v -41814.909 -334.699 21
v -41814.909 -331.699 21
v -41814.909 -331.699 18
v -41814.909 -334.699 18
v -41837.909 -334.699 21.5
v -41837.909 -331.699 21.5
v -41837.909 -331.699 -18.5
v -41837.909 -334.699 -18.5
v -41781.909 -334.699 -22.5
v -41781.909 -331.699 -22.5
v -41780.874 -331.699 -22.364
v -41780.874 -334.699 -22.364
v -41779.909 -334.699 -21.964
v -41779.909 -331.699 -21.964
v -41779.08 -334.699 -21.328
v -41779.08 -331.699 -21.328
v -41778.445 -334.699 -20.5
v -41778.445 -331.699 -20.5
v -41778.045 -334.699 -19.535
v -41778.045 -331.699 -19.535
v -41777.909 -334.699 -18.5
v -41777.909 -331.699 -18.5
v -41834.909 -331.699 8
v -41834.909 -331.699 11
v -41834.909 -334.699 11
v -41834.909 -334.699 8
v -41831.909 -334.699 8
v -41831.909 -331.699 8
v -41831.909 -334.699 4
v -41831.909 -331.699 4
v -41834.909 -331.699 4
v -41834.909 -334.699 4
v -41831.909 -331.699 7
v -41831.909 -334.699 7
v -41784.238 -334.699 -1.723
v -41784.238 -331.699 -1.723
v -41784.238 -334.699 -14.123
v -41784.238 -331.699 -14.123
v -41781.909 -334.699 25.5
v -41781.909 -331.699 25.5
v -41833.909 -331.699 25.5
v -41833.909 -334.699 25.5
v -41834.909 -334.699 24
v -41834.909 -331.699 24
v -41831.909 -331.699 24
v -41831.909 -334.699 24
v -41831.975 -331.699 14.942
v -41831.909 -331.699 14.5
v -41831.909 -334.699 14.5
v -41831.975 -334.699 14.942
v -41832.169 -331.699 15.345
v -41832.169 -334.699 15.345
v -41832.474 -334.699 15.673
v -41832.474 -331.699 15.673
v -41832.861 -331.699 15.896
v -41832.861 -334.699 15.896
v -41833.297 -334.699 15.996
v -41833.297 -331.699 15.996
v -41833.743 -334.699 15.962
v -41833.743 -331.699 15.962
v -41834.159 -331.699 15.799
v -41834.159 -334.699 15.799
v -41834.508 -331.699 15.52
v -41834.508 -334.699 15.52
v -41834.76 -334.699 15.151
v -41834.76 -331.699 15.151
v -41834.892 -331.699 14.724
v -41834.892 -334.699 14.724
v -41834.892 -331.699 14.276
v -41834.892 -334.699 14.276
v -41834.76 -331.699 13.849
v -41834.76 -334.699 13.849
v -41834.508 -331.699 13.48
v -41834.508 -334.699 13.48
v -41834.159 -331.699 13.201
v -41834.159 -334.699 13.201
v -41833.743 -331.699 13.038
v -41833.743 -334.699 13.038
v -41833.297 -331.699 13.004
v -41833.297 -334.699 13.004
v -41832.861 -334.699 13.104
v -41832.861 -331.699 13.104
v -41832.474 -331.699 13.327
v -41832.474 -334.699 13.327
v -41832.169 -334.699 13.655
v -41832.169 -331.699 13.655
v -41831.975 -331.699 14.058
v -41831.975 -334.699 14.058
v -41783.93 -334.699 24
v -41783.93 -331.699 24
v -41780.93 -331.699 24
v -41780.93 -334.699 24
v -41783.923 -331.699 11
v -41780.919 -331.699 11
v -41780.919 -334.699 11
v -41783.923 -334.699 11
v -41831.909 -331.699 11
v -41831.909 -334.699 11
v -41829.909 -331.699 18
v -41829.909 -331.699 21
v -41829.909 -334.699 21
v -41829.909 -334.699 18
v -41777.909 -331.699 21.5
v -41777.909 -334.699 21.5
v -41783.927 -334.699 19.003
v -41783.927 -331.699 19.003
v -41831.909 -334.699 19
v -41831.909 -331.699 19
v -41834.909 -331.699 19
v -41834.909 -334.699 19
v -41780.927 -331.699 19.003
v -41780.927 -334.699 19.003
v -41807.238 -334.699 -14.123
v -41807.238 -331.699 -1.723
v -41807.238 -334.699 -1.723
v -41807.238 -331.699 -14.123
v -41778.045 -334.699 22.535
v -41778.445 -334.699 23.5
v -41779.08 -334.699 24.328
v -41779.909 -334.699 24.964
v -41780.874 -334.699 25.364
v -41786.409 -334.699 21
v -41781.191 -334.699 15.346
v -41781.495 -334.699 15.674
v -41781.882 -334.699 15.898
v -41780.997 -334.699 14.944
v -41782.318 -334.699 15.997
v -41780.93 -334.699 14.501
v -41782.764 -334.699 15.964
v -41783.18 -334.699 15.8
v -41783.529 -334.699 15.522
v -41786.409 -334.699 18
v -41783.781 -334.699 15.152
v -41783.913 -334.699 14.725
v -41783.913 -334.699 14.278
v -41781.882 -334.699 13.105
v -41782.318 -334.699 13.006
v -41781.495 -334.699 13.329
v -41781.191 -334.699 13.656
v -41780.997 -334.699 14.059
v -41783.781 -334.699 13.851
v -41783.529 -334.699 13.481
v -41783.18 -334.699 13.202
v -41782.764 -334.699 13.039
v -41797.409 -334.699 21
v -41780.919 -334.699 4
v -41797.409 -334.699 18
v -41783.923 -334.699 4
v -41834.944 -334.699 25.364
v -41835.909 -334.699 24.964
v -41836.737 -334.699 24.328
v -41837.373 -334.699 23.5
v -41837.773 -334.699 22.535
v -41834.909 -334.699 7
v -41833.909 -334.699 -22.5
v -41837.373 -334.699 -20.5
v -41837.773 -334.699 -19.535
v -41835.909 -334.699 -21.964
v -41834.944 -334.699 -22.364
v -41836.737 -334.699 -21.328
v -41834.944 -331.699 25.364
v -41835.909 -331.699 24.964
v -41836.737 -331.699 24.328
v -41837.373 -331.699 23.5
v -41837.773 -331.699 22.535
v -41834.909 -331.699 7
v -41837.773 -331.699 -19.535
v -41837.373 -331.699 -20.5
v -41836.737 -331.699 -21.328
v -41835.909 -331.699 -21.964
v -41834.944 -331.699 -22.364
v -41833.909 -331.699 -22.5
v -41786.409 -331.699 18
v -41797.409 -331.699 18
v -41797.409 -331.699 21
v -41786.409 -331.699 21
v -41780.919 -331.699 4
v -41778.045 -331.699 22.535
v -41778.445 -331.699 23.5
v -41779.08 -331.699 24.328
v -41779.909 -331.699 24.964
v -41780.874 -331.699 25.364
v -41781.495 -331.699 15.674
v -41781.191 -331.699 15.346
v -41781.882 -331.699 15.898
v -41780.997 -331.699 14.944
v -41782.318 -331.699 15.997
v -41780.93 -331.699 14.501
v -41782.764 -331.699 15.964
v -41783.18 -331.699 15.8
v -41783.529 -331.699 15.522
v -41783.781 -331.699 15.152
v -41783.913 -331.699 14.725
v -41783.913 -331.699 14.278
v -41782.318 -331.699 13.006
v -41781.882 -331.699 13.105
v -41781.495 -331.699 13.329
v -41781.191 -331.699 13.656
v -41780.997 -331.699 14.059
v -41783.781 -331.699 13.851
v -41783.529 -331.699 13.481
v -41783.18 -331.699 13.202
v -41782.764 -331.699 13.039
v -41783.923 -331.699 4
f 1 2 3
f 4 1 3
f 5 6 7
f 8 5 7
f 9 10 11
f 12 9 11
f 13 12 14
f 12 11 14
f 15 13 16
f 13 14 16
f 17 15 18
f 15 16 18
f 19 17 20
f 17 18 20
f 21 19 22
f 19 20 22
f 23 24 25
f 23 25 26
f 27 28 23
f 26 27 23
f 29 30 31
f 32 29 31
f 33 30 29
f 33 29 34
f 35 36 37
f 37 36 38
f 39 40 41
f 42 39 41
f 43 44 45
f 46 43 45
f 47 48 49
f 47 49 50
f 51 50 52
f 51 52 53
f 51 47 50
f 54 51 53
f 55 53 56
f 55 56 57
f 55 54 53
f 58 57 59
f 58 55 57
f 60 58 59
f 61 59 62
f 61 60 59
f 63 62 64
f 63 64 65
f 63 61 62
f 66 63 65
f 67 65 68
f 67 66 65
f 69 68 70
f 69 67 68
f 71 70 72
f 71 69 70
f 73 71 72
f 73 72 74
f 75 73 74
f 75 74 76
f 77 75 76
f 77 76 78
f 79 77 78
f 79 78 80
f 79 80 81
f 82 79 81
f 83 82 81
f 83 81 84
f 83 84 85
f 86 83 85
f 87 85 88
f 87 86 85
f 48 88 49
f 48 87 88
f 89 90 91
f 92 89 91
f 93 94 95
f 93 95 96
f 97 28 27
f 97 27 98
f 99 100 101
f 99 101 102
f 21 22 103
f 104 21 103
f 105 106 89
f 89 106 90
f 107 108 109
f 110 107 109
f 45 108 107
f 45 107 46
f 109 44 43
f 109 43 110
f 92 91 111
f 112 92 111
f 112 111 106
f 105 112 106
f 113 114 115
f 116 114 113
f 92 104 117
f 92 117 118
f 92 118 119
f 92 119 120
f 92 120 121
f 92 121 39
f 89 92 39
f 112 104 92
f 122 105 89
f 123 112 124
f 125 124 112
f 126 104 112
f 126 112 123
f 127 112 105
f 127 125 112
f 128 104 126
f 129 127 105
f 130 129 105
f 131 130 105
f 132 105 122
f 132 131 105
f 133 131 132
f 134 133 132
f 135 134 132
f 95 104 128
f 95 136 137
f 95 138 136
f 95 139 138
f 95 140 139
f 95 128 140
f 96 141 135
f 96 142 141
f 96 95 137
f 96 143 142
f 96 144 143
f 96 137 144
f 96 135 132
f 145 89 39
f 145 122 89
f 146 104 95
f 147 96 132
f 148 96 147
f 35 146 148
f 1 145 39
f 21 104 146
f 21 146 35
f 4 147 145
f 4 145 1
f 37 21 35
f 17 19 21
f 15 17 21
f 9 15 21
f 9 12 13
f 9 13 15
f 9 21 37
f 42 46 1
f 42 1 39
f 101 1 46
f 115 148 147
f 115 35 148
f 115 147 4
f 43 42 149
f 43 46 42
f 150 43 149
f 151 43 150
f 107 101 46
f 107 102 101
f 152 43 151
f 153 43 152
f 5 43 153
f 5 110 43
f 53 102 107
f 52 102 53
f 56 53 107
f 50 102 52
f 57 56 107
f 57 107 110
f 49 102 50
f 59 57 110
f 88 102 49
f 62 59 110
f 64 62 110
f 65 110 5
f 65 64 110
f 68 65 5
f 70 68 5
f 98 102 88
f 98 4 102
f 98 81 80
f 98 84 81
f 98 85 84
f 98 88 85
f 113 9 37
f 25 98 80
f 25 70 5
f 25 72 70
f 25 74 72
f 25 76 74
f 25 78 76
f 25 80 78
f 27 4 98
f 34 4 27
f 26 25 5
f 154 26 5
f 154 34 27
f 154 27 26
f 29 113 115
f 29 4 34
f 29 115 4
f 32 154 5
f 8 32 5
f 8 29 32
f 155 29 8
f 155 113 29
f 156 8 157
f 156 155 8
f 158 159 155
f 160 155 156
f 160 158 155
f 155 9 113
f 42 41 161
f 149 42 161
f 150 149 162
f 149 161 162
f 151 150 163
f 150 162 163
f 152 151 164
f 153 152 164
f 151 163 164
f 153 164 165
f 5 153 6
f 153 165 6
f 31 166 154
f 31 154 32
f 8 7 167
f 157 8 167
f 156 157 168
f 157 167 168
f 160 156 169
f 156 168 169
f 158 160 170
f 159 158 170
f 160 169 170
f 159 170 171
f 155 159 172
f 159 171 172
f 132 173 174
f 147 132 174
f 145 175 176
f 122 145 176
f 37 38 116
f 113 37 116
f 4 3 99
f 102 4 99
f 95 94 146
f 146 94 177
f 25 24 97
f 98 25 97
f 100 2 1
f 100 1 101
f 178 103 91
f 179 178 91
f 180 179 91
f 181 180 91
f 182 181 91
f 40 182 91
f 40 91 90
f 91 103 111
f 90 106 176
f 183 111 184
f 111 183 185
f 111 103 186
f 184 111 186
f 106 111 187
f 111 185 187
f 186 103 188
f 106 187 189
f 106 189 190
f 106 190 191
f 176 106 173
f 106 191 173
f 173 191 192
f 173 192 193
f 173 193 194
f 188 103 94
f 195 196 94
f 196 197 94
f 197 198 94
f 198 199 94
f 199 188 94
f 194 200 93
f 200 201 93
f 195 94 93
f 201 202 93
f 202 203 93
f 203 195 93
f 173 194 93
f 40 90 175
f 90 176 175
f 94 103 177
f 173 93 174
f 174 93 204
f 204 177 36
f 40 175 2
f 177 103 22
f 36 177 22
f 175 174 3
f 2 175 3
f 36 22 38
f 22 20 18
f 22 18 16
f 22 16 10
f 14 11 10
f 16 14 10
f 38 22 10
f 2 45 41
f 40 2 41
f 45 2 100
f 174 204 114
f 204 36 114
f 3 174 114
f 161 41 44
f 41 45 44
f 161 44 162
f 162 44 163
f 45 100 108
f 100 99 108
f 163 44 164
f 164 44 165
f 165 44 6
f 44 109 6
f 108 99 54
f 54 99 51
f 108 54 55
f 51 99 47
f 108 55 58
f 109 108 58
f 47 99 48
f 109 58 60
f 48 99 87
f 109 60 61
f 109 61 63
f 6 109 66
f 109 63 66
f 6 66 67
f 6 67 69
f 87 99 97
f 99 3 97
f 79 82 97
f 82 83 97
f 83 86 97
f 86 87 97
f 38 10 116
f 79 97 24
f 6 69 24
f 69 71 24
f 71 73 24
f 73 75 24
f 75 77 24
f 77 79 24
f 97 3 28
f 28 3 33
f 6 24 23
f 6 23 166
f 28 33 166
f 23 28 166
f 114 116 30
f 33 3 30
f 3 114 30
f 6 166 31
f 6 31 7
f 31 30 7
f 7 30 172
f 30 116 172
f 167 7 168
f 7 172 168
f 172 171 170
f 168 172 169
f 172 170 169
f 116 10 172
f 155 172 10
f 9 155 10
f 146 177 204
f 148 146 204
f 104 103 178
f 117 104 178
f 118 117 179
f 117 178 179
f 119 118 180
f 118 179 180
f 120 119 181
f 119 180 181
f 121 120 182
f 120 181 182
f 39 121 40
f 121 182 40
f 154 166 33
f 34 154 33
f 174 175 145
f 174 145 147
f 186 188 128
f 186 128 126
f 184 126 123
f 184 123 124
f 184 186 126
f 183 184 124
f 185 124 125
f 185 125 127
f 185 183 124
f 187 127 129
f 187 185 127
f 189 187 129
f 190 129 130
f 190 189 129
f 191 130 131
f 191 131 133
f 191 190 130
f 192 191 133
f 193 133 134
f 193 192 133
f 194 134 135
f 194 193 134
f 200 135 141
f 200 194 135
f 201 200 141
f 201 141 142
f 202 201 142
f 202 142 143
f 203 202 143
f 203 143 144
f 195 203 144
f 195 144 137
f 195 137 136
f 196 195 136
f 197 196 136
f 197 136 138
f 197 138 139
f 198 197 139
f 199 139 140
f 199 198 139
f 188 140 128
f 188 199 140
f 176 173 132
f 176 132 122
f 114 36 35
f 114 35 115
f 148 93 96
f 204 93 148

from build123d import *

# Parameters (mm, degrees)
CROQUIS1_R                 = 1.5
CROQUIS1_W                 = 15
CROQUIS1_H                 = 3
CROQUIS1_W_2               = 3.003677296
CROQUIS1_H_2               = 7.000000001
CROQUIS1_W_3               = 23
CROQUIS1_H_3               = 12.400000001
SALIENTE_EXTRUIR1_DEPTH    = 3
S_LIDO_MOVER_COPIAR2_ANGLE = 90


with BuildPart() as part:
    # Croquis1 → Saliente-Extruir1 (new body)
    with BuildSketch(Plane(origin=(0, 0, 0), x_dir=(-1, 0, 0), z_dir=(0, 0, 1))):
        with BuildLine():
            Line((41781.908830987, 309.199124202), (41833.908830987, 309.199124202))
            ThreePointArc((41833.908830987, 309.199124202), (41836.737258112, 310.370697077), (41837.908830987, 313.199124202))
            Line((41837.908830987, 313.199124202), (41837.908830987, 353.199124202))
            ThreePointArc((41837.908830987, 353.199124202), (41836.737258112, 356.027551327), (41833.908830987, 357.199124202))
            Line((41833.908830987, 357.199124202), (41781.908830987, 357.199124202))
            ThreePointArc((41781.908830987, 357.199124202), (41779.080403863, 356.027551327), (41777.908830987, 353.199124202))
            Line((41777.908830987, 353.199124202), (41777.908830987, 313.199124202))
            ThreePointArc((41777.908830987, 313.199124202), (41779.080403863, 310.370697077), (41781.908830987, 309.199124202))
        make_face()
        with Locations(Location((41833.408830987, 320.199124198, 0), (0, 0, 180))):
            Circle(CROQUIS1_R, mode=Mode.SUBTRACT)
        with Locations(Location((41782.429915347, 320.197748539, 0), (0, 0, 180))):
            Circle(CROQUIS1_R, mode=Mode.SUBTRACT)
        Polygon((41786.408830987, 313.699124203), (41796.408830987, 313.699124203), (41797.408830987, 313.699124203), (41797.408830987, 316.699124203), (41796.408830987, 316.699124203), (41786.408830987, 316.699124203), align=None, mode=Mode.SUBTRACT)
        Polygon((41780.927290538, 315.695638799), (41783.429912384, 315.695638799), (41783.927165547, 315.695638799), (41783.929915347, 310.699124202), (41780.929915347, 310.699124202), align=None, mode=Mode.SUBTRACT)
        Polygon((41831.908830987, 310.699124202), (41834.408830987, 310.699124202), (41834.908830987, 310.699124202), (41834.908830987, 315.699124202), (41834.408830987, 315.699124202), (41831.908830987, 315.699124202), align=None, mode=Mode.SUBTRACT)
        Polygon((41831.908830987, 323.699124202), (41834.408830987, 323.699124202), (41834.908830987, 323.699124202), (41834.908830987, 326.699124202), (41834.408830987, 326.699124202), (41831.908830987, 326.699124202), align=None, mode=Mode.SUBTRACT)
        Polygon((41831.908830987, 327.699124202), (41834.408830987, 327.699124202), (41834.908830987, 327.699124202), (41834.908830987, 330.699124202), (41834.408830987, 330.699124202), (41831.908830987, 330.699124202), align=None, mode=Mode.SUBTRACT)
        with Locations((41822.408830987, 315.199124203)):
            Rectangle(CROQUIS1_W, CROQUIS1_H, mode=Mode.SUBTRACT)
        with Locations((41782.421247435, 327.199124203)):
            Rectangle(CROQUIS1_W_2, CROQUIS1_H_2, mode=Mode.SUBTRACT)
        with Locations((41795.738219532, 342.622009866)):
            Rectangle(CROQUIS1_W_3, CROQUIS1_H_3, mode=Mode.SUBTRACT)
    extrude(amount=SALIENTE_EXTRUIR1_DEPTH)


with BuildPart() as part_1:
    # Sólido-Mover/Copiar2: moved
    add(part.part.rotate(Axis((0, -333.199124202, 1.5), (1, 0, 0)), S_LIDO_MOVER_COPIAR2_ANGLE))


solid = part_1.part
